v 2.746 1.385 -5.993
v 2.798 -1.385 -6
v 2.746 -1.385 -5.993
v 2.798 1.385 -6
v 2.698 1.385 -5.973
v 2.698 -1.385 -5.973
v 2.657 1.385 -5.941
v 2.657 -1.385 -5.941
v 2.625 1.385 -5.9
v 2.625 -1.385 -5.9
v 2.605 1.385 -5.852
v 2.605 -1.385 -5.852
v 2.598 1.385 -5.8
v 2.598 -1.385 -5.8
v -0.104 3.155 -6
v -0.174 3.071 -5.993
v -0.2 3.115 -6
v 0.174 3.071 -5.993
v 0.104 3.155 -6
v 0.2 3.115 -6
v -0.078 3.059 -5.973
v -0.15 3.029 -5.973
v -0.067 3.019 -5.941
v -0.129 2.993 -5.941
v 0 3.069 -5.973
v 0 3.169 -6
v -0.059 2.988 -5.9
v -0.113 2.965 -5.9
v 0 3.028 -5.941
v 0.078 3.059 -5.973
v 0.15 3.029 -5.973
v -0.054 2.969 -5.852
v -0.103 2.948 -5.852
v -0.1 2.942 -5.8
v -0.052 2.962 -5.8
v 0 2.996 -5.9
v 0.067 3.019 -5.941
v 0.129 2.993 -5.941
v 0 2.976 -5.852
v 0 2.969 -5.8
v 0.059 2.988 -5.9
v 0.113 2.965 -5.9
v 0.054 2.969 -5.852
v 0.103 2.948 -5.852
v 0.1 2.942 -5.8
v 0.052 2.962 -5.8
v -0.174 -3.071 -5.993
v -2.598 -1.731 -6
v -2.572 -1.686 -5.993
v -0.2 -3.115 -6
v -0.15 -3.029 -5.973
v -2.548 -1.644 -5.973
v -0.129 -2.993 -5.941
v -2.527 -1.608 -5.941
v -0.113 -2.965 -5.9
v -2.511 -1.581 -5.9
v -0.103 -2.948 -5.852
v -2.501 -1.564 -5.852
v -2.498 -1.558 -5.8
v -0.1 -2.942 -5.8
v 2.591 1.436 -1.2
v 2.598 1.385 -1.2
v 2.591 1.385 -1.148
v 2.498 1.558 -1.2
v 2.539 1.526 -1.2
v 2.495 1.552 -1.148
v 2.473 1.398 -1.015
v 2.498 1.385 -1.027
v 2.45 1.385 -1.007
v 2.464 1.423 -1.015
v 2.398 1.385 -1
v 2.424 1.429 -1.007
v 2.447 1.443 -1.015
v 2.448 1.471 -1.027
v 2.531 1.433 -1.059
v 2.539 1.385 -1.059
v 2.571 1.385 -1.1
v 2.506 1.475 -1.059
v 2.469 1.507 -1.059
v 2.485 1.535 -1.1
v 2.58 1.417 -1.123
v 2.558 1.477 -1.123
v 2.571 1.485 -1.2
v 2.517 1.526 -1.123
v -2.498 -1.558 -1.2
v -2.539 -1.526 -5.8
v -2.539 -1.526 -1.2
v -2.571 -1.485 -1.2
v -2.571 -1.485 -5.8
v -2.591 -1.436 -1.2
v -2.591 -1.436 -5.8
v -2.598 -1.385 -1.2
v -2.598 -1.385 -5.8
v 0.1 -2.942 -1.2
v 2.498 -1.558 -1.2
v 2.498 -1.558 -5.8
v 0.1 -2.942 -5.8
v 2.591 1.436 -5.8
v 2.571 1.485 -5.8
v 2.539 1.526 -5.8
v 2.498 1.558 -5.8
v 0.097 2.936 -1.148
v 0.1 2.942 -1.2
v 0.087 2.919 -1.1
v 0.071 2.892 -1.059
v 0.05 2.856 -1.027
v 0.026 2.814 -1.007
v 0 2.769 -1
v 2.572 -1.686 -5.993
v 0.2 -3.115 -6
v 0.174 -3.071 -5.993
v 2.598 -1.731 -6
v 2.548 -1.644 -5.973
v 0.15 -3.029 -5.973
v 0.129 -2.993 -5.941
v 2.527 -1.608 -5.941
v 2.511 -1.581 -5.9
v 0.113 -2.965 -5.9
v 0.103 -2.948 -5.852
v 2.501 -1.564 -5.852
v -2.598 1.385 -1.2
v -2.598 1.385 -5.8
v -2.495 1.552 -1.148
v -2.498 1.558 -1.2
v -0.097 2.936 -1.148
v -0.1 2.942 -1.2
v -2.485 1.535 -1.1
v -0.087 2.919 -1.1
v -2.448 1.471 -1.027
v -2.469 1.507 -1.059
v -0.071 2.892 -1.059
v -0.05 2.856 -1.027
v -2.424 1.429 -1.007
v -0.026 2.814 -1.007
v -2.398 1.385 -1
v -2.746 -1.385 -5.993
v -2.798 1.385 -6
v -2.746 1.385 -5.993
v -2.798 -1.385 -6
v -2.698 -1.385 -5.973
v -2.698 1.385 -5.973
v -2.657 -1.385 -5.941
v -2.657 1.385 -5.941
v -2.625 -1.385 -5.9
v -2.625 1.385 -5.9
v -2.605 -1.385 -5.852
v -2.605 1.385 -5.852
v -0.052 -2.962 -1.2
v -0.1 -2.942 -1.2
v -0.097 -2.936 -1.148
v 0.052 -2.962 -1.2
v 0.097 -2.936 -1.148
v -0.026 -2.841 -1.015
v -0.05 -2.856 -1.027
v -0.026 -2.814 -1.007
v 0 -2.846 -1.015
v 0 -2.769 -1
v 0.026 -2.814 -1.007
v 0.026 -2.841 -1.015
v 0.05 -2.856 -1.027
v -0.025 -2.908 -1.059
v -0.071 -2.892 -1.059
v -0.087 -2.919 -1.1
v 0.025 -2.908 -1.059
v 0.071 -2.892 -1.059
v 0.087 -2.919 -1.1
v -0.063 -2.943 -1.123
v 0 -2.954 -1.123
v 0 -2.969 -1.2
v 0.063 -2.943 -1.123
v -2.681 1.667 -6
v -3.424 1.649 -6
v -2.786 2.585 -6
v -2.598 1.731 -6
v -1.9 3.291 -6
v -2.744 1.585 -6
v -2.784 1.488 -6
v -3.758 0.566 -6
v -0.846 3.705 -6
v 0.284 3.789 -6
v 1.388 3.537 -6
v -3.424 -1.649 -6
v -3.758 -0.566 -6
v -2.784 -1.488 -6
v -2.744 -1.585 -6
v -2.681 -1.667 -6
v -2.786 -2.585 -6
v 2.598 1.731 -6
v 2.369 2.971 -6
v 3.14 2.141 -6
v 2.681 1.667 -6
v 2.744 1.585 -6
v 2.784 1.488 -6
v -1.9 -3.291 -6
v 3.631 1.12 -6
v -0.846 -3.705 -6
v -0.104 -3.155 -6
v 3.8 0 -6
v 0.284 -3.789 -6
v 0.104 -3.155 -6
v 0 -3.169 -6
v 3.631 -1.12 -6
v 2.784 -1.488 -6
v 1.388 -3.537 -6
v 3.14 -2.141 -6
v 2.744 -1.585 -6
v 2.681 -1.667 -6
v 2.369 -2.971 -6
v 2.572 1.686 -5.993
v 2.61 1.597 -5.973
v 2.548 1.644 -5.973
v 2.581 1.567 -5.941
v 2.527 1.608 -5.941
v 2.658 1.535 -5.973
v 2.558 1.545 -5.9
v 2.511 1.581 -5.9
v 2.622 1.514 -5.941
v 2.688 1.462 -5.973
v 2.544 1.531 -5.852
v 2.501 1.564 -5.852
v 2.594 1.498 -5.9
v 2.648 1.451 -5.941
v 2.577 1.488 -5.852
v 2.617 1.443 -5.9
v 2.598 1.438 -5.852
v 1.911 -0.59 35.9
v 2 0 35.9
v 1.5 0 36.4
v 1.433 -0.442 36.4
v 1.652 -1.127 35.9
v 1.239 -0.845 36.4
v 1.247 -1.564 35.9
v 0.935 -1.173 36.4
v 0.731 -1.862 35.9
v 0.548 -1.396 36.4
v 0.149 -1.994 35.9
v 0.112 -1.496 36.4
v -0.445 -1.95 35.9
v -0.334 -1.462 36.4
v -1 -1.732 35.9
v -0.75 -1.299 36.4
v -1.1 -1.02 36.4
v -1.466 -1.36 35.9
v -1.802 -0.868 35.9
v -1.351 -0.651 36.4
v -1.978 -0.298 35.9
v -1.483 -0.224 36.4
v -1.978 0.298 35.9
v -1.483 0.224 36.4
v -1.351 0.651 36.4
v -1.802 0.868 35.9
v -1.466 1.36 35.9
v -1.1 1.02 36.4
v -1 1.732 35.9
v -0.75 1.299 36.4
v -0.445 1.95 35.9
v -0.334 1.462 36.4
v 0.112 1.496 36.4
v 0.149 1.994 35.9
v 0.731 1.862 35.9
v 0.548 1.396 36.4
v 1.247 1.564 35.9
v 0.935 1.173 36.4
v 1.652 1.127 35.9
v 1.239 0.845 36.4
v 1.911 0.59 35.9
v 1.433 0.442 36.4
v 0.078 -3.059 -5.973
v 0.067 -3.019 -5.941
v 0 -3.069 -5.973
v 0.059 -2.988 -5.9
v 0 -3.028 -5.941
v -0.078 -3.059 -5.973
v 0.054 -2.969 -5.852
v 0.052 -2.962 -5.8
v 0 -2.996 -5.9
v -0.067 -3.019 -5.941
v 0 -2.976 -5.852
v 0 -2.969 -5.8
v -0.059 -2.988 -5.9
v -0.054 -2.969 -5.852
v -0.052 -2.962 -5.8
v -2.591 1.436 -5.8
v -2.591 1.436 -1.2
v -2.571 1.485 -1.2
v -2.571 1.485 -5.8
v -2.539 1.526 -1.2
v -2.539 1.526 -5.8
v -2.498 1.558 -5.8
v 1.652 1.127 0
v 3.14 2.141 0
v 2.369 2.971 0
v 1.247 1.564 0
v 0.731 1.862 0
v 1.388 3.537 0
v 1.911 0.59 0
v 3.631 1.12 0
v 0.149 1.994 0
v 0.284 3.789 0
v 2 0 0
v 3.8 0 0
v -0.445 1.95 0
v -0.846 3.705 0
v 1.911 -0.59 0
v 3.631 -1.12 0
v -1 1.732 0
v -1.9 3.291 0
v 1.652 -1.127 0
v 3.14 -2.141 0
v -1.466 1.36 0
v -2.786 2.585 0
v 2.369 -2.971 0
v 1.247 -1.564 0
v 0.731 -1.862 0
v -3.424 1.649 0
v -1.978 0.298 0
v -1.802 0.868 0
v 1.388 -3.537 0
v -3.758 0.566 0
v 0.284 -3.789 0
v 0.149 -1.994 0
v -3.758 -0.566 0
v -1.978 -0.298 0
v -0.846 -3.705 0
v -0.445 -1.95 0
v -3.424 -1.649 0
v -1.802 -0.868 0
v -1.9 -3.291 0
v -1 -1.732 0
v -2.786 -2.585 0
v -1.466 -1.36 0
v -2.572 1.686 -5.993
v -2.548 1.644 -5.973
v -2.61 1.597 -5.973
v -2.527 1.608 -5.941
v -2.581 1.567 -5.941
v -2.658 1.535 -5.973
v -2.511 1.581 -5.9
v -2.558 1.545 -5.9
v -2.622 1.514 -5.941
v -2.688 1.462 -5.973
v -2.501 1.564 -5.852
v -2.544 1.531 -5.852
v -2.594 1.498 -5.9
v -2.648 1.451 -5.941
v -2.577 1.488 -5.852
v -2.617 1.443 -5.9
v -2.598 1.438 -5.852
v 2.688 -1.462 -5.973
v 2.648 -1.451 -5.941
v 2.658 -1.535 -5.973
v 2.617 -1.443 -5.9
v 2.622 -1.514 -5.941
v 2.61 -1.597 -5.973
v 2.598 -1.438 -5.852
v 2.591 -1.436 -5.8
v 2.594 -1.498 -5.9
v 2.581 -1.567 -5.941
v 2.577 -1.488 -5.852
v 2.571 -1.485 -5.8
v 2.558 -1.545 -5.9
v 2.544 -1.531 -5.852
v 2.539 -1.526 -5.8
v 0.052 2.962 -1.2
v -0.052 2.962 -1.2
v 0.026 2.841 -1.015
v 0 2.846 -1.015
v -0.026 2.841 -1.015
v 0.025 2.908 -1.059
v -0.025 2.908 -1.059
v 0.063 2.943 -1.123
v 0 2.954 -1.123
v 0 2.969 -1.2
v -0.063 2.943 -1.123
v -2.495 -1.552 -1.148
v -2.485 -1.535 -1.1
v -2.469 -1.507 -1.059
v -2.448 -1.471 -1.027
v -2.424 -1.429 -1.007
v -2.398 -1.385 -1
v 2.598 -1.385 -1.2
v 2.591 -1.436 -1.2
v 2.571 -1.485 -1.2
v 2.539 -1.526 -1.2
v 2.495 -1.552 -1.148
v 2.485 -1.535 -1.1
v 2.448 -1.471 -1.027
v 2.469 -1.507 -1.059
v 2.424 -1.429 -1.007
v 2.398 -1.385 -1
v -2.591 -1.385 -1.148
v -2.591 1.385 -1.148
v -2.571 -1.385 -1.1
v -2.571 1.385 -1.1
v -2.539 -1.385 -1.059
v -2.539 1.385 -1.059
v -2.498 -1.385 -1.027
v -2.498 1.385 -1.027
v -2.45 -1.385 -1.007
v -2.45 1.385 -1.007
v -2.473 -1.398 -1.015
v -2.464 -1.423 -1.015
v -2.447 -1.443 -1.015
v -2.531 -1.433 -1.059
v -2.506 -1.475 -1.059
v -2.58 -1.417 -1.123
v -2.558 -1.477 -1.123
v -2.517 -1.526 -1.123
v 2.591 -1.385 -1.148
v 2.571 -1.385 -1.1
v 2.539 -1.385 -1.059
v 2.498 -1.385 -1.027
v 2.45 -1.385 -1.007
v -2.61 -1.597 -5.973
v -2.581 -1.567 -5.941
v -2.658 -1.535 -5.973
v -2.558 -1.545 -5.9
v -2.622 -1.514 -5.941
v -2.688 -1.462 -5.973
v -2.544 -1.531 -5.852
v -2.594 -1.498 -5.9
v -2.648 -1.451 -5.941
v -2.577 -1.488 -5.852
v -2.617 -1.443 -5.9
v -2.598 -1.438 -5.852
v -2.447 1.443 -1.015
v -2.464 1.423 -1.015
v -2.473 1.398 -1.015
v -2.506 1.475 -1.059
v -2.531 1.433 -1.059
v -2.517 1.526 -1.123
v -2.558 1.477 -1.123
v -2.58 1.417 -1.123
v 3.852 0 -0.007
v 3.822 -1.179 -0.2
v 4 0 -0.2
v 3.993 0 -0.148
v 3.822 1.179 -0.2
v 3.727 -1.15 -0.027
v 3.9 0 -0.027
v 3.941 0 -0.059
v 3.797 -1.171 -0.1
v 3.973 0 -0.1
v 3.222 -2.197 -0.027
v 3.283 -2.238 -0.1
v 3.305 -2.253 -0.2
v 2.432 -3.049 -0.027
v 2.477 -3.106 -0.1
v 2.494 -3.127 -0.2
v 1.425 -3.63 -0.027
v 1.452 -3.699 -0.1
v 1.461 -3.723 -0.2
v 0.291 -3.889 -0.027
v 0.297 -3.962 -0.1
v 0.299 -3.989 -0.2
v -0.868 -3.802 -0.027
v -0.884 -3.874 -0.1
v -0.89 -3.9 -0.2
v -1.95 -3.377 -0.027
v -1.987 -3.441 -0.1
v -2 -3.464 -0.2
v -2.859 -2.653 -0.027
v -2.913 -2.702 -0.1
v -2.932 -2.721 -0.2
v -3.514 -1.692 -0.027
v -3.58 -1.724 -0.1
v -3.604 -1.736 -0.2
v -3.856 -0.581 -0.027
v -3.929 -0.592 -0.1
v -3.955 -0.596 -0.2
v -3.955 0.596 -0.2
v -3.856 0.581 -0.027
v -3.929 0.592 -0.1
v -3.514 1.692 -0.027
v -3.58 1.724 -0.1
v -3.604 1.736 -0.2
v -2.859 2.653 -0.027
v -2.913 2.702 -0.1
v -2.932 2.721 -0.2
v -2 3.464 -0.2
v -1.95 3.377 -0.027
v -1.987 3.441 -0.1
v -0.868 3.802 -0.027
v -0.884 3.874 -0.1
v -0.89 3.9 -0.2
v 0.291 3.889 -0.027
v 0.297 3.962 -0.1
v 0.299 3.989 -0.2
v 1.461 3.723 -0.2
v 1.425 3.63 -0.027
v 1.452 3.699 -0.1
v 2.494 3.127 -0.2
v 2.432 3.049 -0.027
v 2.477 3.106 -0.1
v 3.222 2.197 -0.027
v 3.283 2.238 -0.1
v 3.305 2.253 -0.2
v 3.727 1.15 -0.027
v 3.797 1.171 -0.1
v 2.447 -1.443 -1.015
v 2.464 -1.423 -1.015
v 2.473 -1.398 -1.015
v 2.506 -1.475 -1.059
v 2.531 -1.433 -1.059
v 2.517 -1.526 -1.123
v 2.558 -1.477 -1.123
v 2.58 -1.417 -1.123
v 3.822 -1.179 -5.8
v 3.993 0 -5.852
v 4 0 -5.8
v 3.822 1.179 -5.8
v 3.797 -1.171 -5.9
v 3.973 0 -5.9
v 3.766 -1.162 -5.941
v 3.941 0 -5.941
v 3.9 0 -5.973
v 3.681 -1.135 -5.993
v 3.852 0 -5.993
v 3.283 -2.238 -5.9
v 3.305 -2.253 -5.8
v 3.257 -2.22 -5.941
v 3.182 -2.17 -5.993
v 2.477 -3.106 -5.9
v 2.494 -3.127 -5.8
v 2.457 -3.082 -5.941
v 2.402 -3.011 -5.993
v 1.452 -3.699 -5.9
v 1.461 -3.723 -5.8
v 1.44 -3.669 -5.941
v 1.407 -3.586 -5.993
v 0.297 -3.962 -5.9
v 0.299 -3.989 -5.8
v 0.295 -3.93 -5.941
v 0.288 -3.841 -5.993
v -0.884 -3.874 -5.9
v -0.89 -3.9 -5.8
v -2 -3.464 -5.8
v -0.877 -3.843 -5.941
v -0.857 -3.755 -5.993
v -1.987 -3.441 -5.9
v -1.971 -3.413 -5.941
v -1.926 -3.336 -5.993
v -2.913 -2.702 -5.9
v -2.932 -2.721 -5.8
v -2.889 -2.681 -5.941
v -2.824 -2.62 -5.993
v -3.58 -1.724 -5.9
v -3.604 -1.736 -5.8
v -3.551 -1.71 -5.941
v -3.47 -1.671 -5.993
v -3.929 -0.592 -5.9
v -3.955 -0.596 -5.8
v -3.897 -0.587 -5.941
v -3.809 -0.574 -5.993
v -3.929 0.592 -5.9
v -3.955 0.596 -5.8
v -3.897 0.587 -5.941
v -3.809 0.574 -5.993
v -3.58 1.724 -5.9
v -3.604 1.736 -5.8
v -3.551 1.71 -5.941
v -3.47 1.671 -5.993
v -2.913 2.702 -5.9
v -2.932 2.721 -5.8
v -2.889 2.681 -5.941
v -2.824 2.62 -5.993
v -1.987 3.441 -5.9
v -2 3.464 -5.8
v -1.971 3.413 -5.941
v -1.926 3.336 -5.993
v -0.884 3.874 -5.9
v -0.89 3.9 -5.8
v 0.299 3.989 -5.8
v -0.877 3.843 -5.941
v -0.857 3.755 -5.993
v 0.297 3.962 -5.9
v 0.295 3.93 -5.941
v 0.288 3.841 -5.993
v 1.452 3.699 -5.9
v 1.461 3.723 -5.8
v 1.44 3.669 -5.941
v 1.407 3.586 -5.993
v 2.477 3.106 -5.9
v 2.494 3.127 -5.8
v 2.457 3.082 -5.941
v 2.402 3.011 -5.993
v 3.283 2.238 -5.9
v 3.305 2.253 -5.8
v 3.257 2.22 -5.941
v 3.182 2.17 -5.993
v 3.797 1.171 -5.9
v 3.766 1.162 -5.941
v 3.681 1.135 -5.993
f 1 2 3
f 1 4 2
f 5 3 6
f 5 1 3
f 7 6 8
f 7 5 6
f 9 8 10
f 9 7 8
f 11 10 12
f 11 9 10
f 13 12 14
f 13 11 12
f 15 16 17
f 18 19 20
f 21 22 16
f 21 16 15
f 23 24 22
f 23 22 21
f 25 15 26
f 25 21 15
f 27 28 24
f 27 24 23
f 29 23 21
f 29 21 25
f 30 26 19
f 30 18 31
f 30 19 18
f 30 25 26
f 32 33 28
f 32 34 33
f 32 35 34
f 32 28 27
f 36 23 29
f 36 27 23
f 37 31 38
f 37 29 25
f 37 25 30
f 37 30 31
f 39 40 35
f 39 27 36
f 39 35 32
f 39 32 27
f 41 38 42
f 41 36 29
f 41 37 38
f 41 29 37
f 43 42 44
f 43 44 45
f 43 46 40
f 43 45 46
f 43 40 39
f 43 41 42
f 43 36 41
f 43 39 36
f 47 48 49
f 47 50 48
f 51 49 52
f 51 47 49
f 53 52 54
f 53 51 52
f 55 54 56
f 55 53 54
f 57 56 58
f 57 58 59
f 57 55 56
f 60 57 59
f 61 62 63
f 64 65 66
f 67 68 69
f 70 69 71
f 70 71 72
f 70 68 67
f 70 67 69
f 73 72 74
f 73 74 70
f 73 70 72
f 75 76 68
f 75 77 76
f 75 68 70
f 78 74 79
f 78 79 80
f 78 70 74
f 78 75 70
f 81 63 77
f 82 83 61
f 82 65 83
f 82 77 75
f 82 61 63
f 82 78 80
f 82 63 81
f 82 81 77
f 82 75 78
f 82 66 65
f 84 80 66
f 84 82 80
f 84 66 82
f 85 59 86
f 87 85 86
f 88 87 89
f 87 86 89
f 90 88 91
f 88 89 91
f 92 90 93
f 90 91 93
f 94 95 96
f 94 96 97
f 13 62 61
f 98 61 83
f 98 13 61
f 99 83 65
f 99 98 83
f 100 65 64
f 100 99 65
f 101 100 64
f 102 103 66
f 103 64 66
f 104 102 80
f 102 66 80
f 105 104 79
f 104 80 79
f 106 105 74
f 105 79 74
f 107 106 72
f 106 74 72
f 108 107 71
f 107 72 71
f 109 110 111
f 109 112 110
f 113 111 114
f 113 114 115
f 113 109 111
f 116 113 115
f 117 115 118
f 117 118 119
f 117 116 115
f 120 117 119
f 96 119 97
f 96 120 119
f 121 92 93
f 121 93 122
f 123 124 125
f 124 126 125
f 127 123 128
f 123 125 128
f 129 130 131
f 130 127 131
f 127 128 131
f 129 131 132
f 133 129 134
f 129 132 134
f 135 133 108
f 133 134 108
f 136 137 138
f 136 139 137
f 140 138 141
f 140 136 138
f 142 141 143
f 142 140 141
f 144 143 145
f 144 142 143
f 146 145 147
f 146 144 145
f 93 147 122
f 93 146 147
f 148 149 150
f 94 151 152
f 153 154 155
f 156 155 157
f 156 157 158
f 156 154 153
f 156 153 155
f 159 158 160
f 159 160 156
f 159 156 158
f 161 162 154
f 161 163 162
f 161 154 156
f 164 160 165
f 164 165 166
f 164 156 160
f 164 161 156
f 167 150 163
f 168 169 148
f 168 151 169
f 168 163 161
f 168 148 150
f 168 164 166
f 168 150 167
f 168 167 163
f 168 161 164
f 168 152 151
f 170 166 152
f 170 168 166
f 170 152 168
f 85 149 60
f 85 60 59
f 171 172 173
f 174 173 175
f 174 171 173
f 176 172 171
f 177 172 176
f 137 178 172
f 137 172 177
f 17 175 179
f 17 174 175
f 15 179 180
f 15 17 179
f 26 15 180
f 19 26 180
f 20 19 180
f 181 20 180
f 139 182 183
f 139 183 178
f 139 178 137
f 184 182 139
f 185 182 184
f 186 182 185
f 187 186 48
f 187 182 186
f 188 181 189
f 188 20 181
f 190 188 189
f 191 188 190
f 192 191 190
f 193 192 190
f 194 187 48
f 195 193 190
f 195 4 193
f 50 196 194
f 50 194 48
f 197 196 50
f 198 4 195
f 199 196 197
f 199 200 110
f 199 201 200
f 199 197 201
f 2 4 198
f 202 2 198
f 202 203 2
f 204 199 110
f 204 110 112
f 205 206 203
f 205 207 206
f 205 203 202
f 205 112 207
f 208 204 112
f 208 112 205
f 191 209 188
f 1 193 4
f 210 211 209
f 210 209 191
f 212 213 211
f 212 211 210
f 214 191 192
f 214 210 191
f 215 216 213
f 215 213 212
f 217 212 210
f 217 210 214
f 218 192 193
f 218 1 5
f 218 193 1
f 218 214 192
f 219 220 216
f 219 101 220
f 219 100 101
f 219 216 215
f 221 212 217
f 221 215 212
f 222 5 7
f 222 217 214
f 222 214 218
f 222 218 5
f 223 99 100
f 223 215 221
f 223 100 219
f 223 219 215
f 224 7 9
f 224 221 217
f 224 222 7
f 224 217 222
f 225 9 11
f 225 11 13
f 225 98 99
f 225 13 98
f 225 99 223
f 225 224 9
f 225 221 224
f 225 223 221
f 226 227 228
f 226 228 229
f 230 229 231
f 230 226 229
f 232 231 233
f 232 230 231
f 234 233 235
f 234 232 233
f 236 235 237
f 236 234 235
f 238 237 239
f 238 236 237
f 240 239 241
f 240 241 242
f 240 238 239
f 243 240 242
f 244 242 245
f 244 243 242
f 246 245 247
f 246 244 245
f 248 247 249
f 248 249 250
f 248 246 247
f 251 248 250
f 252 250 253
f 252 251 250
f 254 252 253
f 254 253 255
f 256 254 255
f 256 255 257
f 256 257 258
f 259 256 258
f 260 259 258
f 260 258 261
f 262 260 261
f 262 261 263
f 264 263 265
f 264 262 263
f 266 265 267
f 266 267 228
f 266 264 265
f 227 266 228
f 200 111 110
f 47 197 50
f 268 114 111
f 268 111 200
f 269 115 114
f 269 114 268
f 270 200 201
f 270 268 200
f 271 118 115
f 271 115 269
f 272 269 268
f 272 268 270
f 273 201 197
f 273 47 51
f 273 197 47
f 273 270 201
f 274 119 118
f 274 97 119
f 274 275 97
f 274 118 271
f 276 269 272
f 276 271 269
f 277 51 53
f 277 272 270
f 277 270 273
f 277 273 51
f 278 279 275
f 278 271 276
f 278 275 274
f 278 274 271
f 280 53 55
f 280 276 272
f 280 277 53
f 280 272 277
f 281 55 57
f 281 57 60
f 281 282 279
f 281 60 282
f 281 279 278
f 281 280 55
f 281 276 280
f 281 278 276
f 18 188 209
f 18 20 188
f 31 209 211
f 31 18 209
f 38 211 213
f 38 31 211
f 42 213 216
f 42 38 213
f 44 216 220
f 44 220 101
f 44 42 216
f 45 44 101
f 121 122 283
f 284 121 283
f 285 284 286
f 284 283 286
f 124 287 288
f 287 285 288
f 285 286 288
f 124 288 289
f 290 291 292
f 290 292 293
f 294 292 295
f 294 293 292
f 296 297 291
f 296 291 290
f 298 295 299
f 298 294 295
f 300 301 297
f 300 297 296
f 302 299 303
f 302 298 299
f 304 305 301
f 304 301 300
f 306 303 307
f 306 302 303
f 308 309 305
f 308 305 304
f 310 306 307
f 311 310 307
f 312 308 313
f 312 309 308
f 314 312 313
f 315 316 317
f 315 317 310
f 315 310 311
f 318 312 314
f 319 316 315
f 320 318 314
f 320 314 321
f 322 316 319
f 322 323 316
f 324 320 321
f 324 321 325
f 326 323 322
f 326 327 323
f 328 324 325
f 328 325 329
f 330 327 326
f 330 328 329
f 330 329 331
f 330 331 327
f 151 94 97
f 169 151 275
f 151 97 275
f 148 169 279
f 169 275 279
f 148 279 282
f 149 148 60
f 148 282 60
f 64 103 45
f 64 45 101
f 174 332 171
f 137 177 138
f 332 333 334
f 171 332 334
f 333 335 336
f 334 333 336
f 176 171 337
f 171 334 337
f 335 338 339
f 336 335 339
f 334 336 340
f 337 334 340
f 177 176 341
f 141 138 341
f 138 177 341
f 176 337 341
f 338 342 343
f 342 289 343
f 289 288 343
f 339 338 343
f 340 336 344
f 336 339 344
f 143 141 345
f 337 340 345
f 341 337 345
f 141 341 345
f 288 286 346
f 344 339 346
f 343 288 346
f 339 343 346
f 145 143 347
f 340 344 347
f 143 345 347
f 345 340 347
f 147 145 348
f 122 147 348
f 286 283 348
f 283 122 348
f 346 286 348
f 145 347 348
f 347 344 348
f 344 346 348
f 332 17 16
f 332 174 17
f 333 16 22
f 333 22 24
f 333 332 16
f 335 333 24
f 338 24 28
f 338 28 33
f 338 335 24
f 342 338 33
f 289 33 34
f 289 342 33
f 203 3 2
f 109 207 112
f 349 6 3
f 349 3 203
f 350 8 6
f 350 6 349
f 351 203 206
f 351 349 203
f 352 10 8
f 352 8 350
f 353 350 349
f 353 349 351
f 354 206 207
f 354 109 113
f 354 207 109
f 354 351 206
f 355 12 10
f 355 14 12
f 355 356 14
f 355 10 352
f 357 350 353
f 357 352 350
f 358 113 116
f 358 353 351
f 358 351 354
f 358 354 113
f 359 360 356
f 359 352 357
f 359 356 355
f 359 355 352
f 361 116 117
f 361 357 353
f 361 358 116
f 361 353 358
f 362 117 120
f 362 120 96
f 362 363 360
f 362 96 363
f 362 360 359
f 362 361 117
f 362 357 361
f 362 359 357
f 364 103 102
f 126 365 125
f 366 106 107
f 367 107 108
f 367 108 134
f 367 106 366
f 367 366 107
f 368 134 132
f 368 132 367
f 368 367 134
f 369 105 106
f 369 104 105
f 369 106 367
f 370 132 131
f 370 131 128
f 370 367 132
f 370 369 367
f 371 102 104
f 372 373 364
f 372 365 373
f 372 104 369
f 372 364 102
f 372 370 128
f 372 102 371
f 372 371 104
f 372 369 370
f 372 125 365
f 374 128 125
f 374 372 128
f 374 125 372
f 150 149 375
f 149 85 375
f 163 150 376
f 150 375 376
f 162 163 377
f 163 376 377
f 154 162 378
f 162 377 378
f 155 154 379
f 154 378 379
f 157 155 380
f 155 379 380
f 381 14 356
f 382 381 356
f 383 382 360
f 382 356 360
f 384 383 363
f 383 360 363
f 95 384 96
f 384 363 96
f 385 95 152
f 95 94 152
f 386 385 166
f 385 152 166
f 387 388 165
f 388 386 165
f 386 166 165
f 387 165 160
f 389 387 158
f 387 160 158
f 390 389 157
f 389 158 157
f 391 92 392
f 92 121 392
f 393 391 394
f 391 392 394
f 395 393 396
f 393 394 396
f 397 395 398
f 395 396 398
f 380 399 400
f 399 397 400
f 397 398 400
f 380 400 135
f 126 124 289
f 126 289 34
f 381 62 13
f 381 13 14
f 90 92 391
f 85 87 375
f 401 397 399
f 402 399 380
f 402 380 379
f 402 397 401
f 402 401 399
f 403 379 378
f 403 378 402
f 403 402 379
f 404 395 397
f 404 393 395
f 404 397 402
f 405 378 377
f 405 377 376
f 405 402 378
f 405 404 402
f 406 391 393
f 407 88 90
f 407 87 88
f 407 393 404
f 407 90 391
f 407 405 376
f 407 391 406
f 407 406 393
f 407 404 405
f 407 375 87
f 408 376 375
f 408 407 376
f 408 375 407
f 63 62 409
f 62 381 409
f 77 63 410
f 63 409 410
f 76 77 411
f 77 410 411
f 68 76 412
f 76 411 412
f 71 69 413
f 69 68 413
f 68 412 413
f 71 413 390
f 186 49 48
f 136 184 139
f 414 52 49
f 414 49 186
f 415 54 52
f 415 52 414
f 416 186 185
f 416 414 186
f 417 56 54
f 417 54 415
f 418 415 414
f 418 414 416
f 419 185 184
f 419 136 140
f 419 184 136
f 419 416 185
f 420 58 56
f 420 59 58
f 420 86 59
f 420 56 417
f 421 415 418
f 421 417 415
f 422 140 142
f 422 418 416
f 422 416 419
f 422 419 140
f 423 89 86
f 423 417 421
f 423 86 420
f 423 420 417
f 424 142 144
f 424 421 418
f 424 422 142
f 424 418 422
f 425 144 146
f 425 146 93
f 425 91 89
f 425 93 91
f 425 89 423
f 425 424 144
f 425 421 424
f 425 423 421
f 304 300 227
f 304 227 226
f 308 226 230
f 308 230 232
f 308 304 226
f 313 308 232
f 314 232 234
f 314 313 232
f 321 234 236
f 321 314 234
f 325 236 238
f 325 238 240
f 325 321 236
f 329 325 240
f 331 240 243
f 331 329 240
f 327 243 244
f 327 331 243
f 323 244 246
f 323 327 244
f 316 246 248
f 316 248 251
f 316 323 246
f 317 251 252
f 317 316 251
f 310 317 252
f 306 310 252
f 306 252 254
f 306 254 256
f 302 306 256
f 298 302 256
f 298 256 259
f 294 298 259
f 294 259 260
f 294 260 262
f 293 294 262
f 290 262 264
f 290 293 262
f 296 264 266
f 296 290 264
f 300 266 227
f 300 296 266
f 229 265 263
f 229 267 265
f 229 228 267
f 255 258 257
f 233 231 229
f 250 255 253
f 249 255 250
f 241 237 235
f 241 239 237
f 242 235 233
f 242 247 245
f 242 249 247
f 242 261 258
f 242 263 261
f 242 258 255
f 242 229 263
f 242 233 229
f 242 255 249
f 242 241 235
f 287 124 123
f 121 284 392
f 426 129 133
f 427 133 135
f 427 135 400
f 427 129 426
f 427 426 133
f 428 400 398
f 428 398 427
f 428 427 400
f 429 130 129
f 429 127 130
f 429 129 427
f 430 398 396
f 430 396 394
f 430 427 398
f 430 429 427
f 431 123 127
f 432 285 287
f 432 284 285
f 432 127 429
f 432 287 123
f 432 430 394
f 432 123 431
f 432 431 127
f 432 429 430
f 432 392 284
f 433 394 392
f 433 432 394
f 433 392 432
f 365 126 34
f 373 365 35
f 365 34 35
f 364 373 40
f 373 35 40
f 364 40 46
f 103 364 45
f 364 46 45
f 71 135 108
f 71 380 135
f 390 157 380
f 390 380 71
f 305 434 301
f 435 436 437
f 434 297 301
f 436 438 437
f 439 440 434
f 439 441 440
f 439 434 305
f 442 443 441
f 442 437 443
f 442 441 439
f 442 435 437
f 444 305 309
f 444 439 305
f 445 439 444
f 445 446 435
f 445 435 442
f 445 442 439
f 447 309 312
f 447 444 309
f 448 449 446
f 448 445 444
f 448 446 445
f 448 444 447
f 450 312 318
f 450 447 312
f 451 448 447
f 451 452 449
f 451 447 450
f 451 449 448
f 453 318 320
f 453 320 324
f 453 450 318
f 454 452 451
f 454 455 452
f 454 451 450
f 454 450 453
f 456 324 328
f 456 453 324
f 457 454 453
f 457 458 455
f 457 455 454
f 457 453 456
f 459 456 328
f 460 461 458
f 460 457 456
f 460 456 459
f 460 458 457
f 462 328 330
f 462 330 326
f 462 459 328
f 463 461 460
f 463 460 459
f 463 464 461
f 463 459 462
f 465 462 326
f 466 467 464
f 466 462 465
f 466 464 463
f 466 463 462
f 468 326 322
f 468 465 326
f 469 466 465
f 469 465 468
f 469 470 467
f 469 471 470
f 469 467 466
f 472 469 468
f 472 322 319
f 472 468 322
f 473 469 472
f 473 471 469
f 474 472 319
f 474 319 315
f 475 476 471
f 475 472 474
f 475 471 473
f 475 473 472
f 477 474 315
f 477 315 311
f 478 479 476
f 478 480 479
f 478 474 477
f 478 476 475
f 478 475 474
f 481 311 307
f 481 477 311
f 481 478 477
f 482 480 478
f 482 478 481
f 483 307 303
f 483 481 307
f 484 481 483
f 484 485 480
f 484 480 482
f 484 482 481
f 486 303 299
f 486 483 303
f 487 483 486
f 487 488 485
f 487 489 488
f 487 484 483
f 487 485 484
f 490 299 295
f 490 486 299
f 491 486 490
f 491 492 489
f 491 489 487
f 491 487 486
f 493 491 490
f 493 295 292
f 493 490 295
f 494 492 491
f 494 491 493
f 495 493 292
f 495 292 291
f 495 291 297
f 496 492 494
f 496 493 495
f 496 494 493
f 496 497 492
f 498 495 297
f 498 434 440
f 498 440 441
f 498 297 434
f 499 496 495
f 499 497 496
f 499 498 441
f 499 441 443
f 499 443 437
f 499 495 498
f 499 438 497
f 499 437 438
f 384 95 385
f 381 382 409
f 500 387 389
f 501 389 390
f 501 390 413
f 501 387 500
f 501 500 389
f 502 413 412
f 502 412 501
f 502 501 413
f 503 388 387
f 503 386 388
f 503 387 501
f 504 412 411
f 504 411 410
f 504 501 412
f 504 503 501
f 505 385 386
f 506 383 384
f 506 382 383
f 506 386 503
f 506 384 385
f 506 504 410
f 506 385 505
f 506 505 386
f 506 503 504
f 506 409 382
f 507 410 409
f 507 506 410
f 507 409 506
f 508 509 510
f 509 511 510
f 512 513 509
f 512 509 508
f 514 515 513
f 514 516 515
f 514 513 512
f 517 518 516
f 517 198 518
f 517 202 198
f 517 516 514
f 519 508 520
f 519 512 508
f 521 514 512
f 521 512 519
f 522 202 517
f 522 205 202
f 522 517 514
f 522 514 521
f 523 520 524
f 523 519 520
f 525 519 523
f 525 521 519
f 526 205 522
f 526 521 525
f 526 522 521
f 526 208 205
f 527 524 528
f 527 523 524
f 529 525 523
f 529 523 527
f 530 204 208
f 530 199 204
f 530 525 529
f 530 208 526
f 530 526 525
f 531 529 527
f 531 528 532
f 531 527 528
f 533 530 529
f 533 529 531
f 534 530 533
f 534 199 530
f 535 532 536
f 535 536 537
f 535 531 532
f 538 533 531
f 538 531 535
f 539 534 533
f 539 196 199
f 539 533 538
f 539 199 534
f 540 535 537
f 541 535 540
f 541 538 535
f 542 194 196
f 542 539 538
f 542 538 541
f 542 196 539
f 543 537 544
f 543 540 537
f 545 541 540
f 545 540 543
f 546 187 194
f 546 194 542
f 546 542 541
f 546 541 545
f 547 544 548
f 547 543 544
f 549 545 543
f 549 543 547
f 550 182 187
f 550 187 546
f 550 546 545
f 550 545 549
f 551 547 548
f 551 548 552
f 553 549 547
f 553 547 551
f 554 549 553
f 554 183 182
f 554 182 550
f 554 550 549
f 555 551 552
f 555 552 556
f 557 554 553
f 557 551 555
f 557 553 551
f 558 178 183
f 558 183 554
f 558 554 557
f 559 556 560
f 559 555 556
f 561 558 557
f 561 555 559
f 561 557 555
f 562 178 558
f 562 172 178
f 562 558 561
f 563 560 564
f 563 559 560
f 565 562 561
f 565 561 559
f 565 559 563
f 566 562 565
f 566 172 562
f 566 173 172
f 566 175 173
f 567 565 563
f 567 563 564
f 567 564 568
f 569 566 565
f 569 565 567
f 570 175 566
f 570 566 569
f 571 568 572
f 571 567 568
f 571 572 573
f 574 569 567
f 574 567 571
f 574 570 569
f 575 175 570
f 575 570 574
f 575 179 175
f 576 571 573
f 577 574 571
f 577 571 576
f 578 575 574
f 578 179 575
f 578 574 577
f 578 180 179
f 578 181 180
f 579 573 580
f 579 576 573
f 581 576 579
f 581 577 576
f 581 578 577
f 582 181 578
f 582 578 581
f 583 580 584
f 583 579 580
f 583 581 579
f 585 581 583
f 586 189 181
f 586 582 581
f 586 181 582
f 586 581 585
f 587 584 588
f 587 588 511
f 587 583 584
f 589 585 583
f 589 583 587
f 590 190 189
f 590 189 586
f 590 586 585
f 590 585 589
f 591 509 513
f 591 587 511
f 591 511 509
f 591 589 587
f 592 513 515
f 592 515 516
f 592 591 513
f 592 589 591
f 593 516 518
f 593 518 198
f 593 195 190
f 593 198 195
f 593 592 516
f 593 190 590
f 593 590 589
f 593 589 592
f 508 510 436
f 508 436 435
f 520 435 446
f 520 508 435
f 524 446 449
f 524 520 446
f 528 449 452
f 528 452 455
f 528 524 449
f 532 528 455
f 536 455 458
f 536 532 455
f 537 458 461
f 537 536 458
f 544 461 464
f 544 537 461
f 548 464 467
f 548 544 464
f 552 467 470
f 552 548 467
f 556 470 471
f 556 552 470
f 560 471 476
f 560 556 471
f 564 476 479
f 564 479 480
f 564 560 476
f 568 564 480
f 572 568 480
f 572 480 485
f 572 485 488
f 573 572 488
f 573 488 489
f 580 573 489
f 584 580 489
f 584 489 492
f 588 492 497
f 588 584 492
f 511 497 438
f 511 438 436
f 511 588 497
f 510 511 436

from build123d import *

# Parameters (mm, degrees)
CHAMFER1_SIZE           = 0.5
FILLET1_R               = 0.2
CUT_EXTRUDE1_DEPTH      = 43.775694052
CUT_EXTRUDE1_DEPTH_BACK = 5
FILLET2_R               = 0.2


with BuildPart() as part:
    # Sketch1 → Revolve1 (revolve)
    with BuildSketch(Plane.YZ, mode=Mode.PRIVATE) as revolve1_sk:
        Polygon((0, 36.4), (2, 36.4), (2, 0), (4, 0), (4, -6), (0, -6), align=None)
    revolve(revolve1_sk.sketch.rotate(Axis((0, 0, 38.548402149), (0, 0, -1)), 90), axis=Axis((0, 0, 38.548402149), (0, 0, -1)))

    # Chamfer1
    chamfer1_edges = [part.edges().sort_by_distance(p)[0] for p in [
        (-2, 0, 36.4),
    ]]
    chamfer(chamfer1_edges, length=CHAMFER1_SIZE)

    # Fillet1
    fillet1_edges = [part.edges().sort_by_distance(p)[0] for p in [
        (-4, 0, -6),
        (-4, 0, 0),
    ]]
    fillet(fillet1_edges, radius=FILLET1_R)

    # Sketch2 → Cut-Extrude1 (cut, two sides: drawn at the far end of the back side and taken through both)
    with BuildSketch(Plane(origin=(0, 0, -6), x_dir=(1, 0, 0), z_dir=(0, 0, -1)).offset(-CUT_EXTRUDE1_DEPTH_BACK)):
        Polygon((0, -3), (2.598076211, -1.5), (2.598076211, 1.5), (0, 3), (-2.598076211, 1.5), (-2.598076211, -1.5), align=None)
    extrude(amount=CUT_EXTRUDE1_DEPTH + CUT_EXTRUDE1_DEPTH_BACK, mode=Mode.SUBTRACT)

    # Fillet2
    fillet2_edges = [part.edges().sort_by_distance(p)[0] for p in [
        (-2.598076211, 1.5, -3.5),
        (-1.299038106, 2.25, -1),
        (0, 3, -3.5),
        (1.299038106, 2.25, -1),
        (2.598076211, 1.5, -3.5),
        (2.598076211, 0, -1),
        (2.598076211, -1.5, -3.5),
        (1.299038106, -2.25, -1),
        (0, -3, -3.5),
        (-1.299038106, -2.25, -1),
        (-2.598076211, -1.5, -3.5),
        (-2.598076211, 0, -1),
        (-1.299038106, 2.25, -6),
        (1.299038106, 2.25, -6),
        (2.598076211, 0, -6),
        (1.299038106, -2.25, -6),
        (-1.299038106, -2.25, -6),
        (-2.598076211, 0, -6),
    ]]
    fillet(fillet2_edges, radius=FILLET2_R)


solid = part.part
